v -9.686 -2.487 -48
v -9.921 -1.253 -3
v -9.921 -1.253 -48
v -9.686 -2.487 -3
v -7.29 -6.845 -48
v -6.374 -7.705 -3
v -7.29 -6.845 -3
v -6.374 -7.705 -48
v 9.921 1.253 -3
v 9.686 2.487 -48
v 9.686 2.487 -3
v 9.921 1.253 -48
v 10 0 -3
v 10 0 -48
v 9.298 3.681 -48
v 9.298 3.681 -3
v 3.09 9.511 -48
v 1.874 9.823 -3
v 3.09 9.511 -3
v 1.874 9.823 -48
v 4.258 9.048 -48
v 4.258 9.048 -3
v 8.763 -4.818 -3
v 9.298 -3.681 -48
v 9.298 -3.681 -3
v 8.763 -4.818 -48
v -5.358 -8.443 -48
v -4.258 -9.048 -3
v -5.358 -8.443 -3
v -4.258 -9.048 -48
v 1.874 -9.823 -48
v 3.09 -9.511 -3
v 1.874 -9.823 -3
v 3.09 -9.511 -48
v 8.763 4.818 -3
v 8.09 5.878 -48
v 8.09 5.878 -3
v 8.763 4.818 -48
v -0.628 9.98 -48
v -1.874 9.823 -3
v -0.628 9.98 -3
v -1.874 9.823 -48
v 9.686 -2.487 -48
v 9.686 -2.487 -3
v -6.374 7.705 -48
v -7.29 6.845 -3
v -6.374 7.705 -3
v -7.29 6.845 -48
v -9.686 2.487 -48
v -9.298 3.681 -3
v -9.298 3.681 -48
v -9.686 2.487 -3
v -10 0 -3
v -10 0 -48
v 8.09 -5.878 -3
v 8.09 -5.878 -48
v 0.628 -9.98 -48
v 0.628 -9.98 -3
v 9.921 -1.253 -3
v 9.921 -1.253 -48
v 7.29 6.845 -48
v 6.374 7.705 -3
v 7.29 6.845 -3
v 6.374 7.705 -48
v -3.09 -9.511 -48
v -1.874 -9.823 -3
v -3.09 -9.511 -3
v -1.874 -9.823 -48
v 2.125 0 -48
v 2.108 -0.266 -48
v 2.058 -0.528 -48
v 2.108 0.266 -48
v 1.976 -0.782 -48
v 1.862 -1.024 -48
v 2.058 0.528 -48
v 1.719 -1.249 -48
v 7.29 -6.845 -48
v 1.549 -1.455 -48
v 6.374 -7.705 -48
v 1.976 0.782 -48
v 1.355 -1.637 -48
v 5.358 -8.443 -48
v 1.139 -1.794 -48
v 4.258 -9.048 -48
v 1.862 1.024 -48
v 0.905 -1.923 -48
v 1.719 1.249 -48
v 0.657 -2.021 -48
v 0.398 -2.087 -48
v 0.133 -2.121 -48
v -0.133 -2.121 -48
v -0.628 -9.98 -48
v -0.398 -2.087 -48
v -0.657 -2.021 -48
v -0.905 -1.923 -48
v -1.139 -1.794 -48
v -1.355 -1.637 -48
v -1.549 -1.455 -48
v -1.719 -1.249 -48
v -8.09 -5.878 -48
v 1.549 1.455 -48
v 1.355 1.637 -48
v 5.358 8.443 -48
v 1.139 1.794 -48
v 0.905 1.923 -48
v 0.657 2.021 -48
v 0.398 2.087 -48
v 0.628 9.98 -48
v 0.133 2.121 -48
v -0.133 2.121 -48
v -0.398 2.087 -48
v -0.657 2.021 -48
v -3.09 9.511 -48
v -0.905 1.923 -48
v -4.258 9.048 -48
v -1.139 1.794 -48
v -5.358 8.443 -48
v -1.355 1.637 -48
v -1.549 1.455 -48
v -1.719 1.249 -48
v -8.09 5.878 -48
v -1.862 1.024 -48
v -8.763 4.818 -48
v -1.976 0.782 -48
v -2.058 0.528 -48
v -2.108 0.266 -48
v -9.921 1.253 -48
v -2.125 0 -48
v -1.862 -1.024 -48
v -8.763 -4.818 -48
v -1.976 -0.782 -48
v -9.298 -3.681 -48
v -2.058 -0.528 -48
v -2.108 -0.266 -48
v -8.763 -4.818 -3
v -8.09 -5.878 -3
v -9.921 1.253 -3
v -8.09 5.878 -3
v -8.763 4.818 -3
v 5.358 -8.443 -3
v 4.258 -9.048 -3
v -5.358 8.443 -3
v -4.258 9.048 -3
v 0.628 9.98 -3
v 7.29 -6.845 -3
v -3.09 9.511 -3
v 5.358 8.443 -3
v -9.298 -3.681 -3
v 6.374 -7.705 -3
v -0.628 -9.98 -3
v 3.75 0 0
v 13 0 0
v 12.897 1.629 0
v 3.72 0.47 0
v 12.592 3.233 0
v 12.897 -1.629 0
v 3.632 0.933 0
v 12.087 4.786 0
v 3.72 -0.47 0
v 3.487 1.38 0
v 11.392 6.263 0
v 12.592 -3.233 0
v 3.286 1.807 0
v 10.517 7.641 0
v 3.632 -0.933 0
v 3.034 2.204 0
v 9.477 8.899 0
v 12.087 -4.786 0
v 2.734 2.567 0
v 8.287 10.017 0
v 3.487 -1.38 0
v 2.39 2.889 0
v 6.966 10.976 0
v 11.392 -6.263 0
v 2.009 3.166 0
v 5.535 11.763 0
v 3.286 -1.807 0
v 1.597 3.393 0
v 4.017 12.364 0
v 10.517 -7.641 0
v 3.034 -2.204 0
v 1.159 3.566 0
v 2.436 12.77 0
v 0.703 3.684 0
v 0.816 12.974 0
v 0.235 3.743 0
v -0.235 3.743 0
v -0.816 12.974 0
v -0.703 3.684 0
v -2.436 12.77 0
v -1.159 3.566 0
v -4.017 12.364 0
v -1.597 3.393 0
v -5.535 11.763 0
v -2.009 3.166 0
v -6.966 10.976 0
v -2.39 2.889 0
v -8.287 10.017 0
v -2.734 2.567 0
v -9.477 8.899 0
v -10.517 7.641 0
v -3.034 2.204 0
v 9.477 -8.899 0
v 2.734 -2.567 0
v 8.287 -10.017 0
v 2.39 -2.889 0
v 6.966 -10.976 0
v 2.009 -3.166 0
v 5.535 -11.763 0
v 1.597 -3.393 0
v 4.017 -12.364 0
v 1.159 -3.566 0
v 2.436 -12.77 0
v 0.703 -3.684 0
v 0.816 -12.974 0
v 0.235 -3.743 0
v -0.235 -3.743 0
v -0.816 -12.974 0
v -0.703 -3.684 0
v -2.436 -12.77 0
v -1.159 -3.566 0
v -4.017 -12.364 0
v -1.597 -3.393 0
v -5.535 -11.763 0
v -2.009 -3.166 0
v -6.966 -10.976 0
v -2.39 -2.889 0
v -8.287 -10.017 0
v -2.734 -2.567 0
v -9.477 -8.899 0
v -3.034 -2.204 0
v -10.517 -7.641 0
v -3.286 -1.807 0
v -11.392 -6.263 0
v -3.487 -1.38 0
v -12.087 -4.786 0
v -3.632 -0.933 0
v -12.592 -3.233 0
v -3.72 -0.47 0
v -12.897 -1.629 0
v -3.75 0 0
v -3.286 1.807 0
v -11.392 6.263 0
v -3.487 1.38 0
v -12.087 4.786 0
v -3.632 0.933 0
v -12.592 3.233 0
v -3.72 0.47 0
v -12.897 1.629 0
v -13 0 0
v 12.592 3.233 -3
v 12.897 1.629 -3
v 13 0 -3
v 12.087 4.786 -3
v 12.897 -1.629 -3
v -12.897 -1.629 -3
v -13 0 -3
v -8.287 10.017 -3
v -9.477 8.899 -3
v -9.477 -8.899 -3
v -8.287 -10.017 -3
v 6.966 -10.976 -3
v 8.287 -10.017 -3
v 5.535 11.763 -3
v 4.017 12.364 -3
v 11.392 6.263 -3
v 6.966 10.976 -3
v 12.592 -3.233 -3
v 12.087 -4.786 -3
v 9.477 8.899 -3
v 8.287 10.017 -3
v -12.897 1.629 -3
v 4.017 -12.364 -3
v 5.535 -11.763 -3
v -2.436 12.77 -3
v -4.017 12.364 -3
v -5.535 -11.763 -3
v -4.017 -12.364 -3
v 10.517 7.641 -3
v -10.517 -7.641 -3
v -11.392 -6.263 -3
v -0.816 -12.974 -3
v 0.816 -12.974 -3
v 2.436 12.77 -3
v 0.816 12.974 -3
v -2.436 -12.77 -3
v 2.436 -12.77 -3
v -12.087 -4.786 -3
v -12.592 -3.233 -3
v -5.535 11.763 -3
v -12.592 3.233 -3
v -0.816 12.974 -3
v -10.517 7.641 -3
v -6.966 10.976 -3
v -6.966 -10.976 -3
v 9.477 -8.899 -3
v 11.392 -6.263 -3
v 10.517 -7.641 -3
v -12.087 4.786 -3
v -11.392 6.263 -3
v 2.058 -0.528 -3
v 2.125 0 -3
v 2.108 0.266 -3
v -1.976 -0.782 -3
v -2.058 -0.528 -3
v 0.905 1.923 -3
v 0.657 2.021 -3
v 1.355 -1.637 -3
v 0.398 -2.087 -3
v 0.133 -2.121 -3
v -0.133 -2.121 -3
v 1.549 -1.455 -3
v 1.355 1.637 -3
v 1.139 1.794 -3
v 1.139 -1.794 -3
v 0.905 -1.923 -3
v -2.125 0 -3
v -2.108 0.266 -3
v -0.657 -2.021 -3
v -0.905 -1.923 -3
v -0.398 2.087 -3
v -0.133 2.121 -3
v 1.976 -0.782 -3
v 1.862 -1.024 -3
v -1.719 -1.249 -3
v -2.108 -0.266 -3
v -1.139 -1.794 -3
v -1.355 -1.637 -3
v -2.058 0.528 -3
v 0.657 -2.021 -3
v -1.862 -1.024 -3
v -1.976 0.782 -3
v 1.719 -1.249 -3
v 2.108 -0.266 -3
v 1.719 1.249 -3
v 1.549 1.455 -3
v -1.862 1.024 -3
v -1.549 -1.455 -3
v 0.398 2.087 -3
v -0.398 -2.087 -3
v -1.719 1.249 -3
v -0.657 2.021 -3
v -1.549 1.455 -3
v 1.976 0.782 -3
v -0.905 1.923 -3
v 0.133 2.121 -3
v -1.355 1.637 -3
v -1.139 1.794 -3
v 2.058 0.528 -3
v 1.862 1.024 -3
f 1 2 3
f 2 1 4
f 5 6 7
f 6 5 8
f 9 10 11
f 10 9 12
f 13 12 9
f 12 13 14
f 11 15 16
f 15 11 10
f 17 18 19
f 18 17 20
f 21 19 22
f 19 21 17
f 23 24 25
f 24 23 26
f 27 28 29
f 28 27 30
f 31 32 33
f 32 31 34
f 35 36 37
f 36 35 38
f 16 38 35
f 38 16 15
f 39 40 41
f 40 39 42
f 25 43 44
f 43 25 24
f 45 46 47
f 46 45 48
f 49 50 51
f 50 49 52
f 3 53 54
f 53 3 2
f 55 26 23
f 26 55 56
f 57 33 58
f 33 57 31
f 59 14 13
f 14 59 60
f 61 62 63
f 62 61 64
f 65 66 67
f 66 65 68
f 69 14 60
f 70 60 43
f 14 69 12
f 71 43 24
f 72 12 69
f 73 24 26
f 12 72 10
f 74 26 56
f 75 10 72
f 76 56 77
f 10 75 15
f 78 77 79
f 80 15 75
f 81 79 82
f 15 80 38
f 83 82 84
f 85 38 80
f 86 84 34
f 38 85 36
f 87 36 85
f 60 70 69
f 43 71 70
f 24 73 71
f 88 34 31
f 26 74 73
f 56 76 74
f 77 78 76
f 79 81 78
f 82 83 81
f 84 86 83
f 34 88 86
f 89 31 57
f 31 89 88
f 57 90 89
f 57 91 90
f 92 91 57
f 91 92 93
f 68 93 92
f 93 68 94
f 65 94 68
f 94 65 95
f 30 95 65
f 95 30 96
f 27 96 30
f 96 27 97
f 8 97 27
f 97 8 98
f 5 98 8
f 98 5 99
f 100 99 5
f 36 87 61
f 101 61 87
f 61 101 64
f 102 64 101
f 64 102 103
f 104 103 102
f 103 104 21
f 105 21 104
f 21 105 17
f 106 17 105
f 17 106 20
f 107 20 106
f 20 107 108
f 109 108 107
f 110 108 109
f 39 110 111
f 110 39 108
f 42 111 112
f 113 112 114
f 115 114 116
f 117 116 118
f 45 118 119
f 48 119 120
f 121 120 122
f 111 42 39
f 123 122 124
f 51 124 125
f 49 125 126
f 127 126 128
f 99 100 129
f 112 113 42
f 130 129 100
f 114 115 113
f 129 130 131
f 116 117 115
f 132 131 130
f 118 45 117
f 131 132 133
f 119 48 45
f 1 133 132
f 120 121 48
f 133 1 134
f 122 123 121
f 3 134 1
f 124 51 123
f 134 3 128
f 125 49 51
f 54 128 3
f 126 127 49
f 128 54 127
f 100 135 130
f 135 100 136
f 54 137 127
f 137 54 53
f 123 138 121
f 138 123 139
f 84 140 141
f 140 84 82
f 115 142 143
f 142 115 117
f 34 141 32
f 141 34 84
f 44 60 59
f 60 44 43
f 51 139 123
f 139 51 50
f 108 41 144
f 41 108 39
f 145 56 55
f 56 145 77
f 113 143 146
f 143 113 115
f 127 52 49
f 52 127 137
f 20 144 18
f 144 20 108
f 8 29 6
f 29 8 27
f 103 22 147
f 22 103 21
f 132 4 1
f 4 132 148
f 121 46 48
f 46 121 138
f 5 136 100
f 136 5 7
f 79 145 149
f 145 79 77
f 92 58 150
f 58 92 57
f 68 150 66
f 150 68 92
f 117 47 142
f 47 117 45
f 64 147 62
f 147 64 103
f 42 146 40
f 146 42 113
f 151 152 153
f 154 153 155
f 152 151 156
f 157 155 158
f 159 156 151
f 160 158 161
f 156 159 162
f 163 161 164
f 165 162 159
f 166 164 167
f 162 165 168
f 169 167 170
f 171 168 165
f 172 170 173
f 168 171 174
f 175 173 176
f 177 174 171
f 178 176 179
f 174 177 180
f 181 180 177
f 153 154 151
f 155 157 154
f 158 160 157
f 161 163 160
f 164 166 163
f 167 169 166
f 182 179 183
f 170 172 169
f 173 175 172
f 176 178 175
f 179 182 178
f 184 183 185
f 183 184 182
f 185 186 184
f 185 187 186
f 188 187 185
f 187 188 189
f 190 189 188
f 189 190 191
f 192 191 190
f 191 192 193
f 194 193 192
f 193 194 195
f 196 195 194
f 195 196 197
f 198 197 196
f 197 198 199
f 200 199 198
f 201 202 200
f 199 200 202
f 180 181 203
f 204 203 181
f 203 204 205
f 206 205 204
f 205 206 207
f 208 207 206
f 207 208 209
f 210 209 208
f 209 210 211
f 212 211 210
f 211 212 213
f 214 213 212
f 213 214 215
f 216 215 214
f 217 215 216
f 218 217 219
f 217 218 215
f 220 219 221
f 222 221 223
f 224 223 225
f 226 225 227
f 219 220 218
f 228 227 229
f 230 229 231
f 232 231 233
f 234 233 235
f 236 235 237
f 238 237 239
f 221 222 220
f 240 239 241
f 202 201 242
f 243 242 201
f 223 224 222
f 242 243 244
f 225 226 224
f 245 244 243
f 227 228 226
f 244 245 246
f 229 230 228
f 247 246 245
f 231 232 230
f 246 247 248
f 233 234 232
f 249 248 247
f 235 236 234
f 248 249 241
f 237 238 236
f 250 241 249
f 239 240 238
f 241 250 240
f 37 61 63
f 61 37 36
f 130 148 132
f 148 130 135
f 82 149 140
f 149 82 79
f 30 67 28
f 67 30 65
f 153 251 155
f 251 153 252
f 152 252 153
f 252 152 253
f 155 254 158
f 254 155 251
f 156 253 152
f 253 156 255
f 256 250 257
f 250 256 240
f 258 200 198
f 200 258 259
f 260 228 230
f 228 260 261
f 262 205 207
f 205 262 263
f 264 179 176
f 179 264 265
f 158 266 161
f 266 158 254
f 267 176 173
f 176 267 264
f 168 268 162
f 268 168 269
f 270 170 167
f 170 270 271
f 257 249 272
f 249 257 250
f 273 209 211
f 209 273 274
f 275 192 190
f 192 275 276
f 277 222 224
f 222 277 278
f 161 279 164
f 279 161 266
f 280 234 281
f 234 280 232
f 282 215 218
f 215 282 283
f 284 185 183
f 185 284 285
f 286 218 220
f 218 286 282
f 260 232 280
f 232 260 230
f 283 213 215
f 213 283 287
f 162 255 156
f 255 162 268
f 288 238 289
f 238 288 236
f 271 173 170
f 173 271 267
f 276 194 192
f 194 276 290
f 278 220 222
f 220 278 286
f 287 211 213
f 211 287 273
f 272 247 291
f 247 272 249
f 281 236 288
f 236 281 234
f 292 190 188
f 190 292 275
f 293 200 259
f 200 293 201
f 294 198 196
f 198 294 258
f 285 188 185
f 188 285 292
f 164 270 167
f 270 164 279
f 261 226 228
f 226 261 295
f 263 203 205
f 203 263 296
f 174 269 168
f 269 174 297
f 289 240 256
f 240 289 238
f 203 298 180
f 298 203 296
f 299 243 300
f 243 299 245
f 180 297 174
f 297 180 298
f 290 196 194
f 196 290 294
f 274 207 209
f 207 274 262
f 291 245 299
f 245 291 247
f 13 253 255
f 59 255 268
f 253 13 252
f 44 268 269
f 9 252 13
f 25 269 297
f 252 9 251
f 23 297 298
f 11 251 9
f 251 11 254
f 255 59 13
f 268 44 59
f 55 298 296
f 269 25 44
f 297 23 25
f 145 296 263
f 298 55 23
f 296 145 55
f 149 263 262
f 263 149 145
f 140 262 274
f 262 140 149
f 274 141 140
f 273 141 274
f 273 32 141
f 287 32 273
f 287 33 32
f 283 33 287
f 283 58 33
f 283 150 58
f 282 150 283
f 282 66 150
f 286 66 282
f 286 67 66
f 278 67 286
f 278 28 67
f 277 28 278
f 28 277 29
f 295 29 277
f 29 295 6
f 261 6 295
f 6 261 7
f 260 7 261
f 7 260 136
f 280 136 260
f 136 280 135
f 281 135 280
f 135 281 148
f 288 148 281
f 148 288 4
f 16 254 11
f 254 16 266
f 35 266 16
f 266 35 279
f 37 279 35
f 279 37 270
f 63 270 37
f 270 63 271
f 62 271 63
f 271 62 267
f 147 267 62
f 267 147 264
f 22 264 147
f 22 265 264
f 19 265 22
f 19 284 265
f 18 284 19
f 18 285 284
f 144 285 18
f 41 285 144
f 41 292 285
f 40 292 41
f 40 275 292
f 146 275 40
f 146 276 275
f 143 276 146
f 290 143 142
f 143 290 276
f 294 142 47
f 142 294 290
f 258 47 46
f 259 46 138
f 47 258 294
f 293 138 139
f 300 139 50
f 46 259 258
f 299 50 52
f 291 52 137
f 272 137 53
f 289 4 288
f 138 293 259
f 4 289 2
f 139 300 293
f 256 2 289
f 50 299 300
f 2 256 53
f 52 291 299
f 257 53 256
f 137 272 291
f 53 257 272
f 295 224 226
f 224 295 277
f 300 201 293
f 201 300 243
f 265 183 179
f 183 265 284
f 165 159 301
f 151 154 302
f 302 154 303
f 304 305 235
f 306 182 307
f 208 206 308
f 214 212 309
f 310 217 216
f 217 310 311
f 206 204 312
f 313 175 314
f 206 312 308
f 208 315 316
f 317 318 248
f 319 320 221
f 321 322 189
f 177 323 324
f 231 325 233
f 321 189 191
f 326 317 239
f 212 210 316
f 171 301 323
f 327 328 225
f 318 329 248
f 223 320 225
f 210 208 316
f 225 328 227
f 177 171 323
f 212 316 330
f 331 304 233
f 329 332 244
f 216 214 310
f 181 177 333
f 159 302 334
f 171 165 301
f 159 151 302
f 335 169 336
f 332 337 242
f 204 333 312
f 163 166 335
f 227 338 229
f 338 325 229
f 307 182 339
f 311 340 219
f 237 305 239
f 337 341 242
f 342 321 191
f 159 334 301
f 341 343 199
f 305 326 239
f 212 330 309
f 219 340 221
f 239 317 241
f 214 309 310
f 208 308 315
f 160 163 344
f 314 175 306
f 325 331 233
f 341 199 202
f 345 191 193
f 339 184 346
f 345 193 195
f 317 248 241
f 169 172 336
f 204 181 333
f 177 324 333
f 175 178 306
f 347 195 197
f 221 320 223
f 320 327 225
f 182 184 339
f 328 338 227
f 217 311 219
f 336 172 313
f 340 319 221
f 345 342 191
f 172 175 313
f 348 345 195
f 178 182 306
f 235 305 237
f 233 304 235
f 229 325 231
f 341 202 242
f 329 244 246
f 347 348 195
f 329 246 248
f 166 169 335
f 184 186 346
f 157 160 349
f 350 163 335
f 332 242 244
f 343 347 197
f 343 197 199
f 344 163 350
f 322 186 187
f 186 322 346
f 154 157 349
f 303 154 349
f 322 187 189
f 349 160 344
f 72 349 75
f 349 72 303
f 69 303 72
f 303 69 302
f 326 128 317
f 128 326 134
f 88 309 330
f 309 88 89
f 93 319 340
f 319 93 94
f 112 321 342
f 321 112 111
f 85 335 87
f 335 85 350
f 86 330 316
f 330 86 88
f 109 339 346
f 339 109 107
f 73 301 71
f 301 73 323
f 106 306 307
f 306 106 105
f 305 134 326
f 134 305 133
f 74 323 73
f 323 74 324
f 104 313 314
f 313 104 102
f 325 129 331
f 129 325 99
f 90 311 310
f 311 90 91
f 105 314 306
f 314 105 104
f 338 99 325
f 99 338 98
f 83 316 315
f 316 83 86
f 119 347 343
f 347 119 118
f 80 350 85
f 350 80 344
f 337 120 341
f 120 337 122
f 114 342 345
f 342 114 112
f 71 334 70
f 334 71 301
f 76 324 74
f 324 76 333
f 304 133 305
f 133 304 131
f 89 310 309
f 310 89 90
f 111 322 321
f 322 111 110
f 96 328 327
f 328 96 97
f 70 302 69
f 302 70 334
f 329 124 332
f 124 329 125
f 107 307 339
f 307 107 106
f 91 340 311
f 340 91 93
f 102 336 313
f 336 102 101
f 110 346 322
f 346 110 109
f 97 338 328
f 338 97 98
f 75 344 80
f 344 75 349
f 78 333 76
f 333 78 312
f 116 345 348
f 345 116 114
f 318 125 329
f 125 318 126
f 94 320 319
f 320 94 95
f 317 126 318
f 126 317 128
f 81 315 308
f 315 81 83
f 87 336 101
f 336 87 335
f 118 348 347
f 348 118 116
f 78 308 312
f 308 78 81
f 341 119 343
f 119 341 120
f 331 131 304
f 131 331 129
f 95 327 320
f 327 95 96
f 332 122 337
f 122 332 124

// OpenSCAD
$fn = 50;


difference() {
	union() {
		translate(v = [0, 0, -48.0000000000]) {
			cylinder(h = 48, r = 10.0000000000);
		}
		translate(v = [0, 0, -3.0000000000]) {
			cylinder(h = 3, r = 13.0000000000);
		}
	}
	union() {
		translate(v = [0, 0, 0]) {
			rotate(a = [0, 0, 0]) {
				difference() {
					union() {
						#translate(v = [0, 0, -48.0000000000]) {
							cylinder(h = 48, r = 2.0000000000);
						}
						#translate(v = [0, 0, -3]) {
							cylinder(h = 3, r1 = 2.1250000000, r2 = 3.7500000000);
						}
						#translate(v = [0, 0, -48.0000000000]) {
							cylinder(h = 48, r = 2.1250000000);
						}
						#translate(v = [0, 0, -48.0000000000]) {
							cylinder(h = 48, r = 2.0000000000);
						}
					}
					union();
				}
			}
		}
	}
}
